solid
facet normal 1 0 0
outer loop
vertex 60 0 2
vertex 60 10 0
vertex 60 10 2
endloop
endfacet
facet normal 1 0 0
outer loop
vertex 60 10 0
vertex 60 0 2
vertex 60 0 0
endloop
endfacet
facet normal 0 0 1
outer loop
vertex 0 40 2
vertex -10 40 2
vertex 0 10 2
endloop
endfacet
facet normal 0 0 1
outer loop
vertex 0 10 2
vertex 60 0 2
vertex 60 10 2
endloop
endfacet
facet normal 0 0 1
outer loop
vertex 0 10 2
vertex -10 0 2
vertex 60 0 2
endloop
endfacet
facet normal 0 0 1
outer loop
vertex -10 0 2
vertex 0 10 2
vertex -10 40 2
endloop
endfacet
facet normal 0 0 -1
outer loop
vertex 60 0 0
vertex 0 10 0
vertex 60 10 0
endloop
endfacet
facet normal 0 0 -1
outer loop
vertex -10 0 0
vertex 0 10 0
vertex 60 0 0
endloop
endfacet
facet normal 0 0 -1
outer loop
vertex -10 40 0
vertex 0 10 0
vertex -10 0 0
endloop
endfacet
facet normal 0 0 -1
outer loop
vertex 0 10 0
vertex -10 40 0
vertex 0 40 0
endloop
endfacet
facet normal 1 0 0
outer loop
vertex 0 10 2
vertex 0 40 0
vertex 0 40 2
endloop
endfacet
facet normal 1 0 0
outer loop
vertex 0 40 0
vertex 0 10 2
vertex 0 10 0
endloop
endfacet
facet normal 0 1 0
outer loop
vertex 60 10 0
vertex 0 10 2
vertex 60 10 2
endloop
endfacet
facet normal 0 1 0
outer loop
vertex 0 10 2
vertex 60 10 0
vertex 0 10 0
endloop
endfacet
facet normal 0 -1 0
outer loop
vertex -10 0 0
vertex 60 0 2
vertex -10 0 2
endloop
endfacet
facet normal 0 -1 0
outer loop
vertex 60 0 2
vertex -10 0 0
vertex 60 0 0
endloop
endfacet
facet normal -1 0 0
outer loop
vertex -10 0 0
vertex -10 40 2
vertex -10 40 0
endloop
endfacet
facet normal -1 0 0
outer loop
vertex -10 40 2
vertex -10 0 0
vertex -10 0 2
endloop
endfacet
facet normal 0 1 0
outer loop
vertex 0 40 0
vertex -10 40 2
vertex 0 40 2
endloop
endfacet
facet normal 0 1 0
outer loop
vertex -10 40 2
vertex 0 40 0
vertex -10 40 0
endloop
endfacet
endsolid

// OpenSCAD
$fn = 48;
wall = 2.0;
thickness = wall;

difference() {
    union() {
        cube([60, 10, thickness]);
        translate([0, 0, 0])
            rotate([0, 0, 90])
                cube([40, 10, thickness]);
    }
    translate([15, 15, -1]) cylinder(h = thickness + 2, r = 2.6);
    translate([45, 25, -1]) cylinder(h = thickness + 2, r = 2.6);
}
